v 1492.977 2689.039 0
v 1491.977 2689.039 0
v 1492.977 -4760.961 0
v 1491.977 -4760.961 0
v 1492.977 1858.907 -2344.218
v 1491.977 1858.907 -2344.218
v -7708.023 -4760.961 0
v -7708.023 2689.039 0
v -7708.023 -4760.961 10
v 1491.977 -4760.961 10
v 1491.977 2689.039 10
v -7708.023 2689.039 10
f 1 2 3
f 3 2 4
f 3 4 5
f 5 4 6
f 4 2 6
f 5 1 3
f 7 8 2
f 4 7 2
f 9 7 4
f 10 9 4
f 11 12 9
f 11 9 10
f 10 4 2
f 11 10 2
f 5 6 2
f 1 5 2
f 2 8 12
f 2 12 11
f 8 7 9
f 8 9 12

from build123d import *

# Parameters (mm, degrees)
SKETCH_1_W      = 9200
SKETCH_1_H      = 7450
EXTRUDE_1_DEPTH = 10
EXTRUDE_2_DEPTH = 1


with BuildPart() as part:
    # Эскиз1 → Бобышка-Вытянуть1 (new body)
    with BuildSketch(Plane.XY):
        with Locations((-3108.022618245, -1035.961292375)):
            Rectangle(SKETCH_1_W, SKETCH_1_H)
    extrude(amount=EXTRUDE_1_DEPTH)


with BuildPart() as body_2:
    # Эскиз2 → Бобышка-Вытянуть2 (new body)
    with BuildSketch(Plane(origin=(1491.977381755, 0, 0), x_dir=(0, 0, -1), z_dir=(1, 0, 0))):
        Polygon((0, -4760.961292375), (2344.218456661, 1858.907414052), (0, 2689.038707625), align=None)
    extrude(amount=EXTRUDE_2_DEPTH)


solid = Compound([part.part, body_2.part])
